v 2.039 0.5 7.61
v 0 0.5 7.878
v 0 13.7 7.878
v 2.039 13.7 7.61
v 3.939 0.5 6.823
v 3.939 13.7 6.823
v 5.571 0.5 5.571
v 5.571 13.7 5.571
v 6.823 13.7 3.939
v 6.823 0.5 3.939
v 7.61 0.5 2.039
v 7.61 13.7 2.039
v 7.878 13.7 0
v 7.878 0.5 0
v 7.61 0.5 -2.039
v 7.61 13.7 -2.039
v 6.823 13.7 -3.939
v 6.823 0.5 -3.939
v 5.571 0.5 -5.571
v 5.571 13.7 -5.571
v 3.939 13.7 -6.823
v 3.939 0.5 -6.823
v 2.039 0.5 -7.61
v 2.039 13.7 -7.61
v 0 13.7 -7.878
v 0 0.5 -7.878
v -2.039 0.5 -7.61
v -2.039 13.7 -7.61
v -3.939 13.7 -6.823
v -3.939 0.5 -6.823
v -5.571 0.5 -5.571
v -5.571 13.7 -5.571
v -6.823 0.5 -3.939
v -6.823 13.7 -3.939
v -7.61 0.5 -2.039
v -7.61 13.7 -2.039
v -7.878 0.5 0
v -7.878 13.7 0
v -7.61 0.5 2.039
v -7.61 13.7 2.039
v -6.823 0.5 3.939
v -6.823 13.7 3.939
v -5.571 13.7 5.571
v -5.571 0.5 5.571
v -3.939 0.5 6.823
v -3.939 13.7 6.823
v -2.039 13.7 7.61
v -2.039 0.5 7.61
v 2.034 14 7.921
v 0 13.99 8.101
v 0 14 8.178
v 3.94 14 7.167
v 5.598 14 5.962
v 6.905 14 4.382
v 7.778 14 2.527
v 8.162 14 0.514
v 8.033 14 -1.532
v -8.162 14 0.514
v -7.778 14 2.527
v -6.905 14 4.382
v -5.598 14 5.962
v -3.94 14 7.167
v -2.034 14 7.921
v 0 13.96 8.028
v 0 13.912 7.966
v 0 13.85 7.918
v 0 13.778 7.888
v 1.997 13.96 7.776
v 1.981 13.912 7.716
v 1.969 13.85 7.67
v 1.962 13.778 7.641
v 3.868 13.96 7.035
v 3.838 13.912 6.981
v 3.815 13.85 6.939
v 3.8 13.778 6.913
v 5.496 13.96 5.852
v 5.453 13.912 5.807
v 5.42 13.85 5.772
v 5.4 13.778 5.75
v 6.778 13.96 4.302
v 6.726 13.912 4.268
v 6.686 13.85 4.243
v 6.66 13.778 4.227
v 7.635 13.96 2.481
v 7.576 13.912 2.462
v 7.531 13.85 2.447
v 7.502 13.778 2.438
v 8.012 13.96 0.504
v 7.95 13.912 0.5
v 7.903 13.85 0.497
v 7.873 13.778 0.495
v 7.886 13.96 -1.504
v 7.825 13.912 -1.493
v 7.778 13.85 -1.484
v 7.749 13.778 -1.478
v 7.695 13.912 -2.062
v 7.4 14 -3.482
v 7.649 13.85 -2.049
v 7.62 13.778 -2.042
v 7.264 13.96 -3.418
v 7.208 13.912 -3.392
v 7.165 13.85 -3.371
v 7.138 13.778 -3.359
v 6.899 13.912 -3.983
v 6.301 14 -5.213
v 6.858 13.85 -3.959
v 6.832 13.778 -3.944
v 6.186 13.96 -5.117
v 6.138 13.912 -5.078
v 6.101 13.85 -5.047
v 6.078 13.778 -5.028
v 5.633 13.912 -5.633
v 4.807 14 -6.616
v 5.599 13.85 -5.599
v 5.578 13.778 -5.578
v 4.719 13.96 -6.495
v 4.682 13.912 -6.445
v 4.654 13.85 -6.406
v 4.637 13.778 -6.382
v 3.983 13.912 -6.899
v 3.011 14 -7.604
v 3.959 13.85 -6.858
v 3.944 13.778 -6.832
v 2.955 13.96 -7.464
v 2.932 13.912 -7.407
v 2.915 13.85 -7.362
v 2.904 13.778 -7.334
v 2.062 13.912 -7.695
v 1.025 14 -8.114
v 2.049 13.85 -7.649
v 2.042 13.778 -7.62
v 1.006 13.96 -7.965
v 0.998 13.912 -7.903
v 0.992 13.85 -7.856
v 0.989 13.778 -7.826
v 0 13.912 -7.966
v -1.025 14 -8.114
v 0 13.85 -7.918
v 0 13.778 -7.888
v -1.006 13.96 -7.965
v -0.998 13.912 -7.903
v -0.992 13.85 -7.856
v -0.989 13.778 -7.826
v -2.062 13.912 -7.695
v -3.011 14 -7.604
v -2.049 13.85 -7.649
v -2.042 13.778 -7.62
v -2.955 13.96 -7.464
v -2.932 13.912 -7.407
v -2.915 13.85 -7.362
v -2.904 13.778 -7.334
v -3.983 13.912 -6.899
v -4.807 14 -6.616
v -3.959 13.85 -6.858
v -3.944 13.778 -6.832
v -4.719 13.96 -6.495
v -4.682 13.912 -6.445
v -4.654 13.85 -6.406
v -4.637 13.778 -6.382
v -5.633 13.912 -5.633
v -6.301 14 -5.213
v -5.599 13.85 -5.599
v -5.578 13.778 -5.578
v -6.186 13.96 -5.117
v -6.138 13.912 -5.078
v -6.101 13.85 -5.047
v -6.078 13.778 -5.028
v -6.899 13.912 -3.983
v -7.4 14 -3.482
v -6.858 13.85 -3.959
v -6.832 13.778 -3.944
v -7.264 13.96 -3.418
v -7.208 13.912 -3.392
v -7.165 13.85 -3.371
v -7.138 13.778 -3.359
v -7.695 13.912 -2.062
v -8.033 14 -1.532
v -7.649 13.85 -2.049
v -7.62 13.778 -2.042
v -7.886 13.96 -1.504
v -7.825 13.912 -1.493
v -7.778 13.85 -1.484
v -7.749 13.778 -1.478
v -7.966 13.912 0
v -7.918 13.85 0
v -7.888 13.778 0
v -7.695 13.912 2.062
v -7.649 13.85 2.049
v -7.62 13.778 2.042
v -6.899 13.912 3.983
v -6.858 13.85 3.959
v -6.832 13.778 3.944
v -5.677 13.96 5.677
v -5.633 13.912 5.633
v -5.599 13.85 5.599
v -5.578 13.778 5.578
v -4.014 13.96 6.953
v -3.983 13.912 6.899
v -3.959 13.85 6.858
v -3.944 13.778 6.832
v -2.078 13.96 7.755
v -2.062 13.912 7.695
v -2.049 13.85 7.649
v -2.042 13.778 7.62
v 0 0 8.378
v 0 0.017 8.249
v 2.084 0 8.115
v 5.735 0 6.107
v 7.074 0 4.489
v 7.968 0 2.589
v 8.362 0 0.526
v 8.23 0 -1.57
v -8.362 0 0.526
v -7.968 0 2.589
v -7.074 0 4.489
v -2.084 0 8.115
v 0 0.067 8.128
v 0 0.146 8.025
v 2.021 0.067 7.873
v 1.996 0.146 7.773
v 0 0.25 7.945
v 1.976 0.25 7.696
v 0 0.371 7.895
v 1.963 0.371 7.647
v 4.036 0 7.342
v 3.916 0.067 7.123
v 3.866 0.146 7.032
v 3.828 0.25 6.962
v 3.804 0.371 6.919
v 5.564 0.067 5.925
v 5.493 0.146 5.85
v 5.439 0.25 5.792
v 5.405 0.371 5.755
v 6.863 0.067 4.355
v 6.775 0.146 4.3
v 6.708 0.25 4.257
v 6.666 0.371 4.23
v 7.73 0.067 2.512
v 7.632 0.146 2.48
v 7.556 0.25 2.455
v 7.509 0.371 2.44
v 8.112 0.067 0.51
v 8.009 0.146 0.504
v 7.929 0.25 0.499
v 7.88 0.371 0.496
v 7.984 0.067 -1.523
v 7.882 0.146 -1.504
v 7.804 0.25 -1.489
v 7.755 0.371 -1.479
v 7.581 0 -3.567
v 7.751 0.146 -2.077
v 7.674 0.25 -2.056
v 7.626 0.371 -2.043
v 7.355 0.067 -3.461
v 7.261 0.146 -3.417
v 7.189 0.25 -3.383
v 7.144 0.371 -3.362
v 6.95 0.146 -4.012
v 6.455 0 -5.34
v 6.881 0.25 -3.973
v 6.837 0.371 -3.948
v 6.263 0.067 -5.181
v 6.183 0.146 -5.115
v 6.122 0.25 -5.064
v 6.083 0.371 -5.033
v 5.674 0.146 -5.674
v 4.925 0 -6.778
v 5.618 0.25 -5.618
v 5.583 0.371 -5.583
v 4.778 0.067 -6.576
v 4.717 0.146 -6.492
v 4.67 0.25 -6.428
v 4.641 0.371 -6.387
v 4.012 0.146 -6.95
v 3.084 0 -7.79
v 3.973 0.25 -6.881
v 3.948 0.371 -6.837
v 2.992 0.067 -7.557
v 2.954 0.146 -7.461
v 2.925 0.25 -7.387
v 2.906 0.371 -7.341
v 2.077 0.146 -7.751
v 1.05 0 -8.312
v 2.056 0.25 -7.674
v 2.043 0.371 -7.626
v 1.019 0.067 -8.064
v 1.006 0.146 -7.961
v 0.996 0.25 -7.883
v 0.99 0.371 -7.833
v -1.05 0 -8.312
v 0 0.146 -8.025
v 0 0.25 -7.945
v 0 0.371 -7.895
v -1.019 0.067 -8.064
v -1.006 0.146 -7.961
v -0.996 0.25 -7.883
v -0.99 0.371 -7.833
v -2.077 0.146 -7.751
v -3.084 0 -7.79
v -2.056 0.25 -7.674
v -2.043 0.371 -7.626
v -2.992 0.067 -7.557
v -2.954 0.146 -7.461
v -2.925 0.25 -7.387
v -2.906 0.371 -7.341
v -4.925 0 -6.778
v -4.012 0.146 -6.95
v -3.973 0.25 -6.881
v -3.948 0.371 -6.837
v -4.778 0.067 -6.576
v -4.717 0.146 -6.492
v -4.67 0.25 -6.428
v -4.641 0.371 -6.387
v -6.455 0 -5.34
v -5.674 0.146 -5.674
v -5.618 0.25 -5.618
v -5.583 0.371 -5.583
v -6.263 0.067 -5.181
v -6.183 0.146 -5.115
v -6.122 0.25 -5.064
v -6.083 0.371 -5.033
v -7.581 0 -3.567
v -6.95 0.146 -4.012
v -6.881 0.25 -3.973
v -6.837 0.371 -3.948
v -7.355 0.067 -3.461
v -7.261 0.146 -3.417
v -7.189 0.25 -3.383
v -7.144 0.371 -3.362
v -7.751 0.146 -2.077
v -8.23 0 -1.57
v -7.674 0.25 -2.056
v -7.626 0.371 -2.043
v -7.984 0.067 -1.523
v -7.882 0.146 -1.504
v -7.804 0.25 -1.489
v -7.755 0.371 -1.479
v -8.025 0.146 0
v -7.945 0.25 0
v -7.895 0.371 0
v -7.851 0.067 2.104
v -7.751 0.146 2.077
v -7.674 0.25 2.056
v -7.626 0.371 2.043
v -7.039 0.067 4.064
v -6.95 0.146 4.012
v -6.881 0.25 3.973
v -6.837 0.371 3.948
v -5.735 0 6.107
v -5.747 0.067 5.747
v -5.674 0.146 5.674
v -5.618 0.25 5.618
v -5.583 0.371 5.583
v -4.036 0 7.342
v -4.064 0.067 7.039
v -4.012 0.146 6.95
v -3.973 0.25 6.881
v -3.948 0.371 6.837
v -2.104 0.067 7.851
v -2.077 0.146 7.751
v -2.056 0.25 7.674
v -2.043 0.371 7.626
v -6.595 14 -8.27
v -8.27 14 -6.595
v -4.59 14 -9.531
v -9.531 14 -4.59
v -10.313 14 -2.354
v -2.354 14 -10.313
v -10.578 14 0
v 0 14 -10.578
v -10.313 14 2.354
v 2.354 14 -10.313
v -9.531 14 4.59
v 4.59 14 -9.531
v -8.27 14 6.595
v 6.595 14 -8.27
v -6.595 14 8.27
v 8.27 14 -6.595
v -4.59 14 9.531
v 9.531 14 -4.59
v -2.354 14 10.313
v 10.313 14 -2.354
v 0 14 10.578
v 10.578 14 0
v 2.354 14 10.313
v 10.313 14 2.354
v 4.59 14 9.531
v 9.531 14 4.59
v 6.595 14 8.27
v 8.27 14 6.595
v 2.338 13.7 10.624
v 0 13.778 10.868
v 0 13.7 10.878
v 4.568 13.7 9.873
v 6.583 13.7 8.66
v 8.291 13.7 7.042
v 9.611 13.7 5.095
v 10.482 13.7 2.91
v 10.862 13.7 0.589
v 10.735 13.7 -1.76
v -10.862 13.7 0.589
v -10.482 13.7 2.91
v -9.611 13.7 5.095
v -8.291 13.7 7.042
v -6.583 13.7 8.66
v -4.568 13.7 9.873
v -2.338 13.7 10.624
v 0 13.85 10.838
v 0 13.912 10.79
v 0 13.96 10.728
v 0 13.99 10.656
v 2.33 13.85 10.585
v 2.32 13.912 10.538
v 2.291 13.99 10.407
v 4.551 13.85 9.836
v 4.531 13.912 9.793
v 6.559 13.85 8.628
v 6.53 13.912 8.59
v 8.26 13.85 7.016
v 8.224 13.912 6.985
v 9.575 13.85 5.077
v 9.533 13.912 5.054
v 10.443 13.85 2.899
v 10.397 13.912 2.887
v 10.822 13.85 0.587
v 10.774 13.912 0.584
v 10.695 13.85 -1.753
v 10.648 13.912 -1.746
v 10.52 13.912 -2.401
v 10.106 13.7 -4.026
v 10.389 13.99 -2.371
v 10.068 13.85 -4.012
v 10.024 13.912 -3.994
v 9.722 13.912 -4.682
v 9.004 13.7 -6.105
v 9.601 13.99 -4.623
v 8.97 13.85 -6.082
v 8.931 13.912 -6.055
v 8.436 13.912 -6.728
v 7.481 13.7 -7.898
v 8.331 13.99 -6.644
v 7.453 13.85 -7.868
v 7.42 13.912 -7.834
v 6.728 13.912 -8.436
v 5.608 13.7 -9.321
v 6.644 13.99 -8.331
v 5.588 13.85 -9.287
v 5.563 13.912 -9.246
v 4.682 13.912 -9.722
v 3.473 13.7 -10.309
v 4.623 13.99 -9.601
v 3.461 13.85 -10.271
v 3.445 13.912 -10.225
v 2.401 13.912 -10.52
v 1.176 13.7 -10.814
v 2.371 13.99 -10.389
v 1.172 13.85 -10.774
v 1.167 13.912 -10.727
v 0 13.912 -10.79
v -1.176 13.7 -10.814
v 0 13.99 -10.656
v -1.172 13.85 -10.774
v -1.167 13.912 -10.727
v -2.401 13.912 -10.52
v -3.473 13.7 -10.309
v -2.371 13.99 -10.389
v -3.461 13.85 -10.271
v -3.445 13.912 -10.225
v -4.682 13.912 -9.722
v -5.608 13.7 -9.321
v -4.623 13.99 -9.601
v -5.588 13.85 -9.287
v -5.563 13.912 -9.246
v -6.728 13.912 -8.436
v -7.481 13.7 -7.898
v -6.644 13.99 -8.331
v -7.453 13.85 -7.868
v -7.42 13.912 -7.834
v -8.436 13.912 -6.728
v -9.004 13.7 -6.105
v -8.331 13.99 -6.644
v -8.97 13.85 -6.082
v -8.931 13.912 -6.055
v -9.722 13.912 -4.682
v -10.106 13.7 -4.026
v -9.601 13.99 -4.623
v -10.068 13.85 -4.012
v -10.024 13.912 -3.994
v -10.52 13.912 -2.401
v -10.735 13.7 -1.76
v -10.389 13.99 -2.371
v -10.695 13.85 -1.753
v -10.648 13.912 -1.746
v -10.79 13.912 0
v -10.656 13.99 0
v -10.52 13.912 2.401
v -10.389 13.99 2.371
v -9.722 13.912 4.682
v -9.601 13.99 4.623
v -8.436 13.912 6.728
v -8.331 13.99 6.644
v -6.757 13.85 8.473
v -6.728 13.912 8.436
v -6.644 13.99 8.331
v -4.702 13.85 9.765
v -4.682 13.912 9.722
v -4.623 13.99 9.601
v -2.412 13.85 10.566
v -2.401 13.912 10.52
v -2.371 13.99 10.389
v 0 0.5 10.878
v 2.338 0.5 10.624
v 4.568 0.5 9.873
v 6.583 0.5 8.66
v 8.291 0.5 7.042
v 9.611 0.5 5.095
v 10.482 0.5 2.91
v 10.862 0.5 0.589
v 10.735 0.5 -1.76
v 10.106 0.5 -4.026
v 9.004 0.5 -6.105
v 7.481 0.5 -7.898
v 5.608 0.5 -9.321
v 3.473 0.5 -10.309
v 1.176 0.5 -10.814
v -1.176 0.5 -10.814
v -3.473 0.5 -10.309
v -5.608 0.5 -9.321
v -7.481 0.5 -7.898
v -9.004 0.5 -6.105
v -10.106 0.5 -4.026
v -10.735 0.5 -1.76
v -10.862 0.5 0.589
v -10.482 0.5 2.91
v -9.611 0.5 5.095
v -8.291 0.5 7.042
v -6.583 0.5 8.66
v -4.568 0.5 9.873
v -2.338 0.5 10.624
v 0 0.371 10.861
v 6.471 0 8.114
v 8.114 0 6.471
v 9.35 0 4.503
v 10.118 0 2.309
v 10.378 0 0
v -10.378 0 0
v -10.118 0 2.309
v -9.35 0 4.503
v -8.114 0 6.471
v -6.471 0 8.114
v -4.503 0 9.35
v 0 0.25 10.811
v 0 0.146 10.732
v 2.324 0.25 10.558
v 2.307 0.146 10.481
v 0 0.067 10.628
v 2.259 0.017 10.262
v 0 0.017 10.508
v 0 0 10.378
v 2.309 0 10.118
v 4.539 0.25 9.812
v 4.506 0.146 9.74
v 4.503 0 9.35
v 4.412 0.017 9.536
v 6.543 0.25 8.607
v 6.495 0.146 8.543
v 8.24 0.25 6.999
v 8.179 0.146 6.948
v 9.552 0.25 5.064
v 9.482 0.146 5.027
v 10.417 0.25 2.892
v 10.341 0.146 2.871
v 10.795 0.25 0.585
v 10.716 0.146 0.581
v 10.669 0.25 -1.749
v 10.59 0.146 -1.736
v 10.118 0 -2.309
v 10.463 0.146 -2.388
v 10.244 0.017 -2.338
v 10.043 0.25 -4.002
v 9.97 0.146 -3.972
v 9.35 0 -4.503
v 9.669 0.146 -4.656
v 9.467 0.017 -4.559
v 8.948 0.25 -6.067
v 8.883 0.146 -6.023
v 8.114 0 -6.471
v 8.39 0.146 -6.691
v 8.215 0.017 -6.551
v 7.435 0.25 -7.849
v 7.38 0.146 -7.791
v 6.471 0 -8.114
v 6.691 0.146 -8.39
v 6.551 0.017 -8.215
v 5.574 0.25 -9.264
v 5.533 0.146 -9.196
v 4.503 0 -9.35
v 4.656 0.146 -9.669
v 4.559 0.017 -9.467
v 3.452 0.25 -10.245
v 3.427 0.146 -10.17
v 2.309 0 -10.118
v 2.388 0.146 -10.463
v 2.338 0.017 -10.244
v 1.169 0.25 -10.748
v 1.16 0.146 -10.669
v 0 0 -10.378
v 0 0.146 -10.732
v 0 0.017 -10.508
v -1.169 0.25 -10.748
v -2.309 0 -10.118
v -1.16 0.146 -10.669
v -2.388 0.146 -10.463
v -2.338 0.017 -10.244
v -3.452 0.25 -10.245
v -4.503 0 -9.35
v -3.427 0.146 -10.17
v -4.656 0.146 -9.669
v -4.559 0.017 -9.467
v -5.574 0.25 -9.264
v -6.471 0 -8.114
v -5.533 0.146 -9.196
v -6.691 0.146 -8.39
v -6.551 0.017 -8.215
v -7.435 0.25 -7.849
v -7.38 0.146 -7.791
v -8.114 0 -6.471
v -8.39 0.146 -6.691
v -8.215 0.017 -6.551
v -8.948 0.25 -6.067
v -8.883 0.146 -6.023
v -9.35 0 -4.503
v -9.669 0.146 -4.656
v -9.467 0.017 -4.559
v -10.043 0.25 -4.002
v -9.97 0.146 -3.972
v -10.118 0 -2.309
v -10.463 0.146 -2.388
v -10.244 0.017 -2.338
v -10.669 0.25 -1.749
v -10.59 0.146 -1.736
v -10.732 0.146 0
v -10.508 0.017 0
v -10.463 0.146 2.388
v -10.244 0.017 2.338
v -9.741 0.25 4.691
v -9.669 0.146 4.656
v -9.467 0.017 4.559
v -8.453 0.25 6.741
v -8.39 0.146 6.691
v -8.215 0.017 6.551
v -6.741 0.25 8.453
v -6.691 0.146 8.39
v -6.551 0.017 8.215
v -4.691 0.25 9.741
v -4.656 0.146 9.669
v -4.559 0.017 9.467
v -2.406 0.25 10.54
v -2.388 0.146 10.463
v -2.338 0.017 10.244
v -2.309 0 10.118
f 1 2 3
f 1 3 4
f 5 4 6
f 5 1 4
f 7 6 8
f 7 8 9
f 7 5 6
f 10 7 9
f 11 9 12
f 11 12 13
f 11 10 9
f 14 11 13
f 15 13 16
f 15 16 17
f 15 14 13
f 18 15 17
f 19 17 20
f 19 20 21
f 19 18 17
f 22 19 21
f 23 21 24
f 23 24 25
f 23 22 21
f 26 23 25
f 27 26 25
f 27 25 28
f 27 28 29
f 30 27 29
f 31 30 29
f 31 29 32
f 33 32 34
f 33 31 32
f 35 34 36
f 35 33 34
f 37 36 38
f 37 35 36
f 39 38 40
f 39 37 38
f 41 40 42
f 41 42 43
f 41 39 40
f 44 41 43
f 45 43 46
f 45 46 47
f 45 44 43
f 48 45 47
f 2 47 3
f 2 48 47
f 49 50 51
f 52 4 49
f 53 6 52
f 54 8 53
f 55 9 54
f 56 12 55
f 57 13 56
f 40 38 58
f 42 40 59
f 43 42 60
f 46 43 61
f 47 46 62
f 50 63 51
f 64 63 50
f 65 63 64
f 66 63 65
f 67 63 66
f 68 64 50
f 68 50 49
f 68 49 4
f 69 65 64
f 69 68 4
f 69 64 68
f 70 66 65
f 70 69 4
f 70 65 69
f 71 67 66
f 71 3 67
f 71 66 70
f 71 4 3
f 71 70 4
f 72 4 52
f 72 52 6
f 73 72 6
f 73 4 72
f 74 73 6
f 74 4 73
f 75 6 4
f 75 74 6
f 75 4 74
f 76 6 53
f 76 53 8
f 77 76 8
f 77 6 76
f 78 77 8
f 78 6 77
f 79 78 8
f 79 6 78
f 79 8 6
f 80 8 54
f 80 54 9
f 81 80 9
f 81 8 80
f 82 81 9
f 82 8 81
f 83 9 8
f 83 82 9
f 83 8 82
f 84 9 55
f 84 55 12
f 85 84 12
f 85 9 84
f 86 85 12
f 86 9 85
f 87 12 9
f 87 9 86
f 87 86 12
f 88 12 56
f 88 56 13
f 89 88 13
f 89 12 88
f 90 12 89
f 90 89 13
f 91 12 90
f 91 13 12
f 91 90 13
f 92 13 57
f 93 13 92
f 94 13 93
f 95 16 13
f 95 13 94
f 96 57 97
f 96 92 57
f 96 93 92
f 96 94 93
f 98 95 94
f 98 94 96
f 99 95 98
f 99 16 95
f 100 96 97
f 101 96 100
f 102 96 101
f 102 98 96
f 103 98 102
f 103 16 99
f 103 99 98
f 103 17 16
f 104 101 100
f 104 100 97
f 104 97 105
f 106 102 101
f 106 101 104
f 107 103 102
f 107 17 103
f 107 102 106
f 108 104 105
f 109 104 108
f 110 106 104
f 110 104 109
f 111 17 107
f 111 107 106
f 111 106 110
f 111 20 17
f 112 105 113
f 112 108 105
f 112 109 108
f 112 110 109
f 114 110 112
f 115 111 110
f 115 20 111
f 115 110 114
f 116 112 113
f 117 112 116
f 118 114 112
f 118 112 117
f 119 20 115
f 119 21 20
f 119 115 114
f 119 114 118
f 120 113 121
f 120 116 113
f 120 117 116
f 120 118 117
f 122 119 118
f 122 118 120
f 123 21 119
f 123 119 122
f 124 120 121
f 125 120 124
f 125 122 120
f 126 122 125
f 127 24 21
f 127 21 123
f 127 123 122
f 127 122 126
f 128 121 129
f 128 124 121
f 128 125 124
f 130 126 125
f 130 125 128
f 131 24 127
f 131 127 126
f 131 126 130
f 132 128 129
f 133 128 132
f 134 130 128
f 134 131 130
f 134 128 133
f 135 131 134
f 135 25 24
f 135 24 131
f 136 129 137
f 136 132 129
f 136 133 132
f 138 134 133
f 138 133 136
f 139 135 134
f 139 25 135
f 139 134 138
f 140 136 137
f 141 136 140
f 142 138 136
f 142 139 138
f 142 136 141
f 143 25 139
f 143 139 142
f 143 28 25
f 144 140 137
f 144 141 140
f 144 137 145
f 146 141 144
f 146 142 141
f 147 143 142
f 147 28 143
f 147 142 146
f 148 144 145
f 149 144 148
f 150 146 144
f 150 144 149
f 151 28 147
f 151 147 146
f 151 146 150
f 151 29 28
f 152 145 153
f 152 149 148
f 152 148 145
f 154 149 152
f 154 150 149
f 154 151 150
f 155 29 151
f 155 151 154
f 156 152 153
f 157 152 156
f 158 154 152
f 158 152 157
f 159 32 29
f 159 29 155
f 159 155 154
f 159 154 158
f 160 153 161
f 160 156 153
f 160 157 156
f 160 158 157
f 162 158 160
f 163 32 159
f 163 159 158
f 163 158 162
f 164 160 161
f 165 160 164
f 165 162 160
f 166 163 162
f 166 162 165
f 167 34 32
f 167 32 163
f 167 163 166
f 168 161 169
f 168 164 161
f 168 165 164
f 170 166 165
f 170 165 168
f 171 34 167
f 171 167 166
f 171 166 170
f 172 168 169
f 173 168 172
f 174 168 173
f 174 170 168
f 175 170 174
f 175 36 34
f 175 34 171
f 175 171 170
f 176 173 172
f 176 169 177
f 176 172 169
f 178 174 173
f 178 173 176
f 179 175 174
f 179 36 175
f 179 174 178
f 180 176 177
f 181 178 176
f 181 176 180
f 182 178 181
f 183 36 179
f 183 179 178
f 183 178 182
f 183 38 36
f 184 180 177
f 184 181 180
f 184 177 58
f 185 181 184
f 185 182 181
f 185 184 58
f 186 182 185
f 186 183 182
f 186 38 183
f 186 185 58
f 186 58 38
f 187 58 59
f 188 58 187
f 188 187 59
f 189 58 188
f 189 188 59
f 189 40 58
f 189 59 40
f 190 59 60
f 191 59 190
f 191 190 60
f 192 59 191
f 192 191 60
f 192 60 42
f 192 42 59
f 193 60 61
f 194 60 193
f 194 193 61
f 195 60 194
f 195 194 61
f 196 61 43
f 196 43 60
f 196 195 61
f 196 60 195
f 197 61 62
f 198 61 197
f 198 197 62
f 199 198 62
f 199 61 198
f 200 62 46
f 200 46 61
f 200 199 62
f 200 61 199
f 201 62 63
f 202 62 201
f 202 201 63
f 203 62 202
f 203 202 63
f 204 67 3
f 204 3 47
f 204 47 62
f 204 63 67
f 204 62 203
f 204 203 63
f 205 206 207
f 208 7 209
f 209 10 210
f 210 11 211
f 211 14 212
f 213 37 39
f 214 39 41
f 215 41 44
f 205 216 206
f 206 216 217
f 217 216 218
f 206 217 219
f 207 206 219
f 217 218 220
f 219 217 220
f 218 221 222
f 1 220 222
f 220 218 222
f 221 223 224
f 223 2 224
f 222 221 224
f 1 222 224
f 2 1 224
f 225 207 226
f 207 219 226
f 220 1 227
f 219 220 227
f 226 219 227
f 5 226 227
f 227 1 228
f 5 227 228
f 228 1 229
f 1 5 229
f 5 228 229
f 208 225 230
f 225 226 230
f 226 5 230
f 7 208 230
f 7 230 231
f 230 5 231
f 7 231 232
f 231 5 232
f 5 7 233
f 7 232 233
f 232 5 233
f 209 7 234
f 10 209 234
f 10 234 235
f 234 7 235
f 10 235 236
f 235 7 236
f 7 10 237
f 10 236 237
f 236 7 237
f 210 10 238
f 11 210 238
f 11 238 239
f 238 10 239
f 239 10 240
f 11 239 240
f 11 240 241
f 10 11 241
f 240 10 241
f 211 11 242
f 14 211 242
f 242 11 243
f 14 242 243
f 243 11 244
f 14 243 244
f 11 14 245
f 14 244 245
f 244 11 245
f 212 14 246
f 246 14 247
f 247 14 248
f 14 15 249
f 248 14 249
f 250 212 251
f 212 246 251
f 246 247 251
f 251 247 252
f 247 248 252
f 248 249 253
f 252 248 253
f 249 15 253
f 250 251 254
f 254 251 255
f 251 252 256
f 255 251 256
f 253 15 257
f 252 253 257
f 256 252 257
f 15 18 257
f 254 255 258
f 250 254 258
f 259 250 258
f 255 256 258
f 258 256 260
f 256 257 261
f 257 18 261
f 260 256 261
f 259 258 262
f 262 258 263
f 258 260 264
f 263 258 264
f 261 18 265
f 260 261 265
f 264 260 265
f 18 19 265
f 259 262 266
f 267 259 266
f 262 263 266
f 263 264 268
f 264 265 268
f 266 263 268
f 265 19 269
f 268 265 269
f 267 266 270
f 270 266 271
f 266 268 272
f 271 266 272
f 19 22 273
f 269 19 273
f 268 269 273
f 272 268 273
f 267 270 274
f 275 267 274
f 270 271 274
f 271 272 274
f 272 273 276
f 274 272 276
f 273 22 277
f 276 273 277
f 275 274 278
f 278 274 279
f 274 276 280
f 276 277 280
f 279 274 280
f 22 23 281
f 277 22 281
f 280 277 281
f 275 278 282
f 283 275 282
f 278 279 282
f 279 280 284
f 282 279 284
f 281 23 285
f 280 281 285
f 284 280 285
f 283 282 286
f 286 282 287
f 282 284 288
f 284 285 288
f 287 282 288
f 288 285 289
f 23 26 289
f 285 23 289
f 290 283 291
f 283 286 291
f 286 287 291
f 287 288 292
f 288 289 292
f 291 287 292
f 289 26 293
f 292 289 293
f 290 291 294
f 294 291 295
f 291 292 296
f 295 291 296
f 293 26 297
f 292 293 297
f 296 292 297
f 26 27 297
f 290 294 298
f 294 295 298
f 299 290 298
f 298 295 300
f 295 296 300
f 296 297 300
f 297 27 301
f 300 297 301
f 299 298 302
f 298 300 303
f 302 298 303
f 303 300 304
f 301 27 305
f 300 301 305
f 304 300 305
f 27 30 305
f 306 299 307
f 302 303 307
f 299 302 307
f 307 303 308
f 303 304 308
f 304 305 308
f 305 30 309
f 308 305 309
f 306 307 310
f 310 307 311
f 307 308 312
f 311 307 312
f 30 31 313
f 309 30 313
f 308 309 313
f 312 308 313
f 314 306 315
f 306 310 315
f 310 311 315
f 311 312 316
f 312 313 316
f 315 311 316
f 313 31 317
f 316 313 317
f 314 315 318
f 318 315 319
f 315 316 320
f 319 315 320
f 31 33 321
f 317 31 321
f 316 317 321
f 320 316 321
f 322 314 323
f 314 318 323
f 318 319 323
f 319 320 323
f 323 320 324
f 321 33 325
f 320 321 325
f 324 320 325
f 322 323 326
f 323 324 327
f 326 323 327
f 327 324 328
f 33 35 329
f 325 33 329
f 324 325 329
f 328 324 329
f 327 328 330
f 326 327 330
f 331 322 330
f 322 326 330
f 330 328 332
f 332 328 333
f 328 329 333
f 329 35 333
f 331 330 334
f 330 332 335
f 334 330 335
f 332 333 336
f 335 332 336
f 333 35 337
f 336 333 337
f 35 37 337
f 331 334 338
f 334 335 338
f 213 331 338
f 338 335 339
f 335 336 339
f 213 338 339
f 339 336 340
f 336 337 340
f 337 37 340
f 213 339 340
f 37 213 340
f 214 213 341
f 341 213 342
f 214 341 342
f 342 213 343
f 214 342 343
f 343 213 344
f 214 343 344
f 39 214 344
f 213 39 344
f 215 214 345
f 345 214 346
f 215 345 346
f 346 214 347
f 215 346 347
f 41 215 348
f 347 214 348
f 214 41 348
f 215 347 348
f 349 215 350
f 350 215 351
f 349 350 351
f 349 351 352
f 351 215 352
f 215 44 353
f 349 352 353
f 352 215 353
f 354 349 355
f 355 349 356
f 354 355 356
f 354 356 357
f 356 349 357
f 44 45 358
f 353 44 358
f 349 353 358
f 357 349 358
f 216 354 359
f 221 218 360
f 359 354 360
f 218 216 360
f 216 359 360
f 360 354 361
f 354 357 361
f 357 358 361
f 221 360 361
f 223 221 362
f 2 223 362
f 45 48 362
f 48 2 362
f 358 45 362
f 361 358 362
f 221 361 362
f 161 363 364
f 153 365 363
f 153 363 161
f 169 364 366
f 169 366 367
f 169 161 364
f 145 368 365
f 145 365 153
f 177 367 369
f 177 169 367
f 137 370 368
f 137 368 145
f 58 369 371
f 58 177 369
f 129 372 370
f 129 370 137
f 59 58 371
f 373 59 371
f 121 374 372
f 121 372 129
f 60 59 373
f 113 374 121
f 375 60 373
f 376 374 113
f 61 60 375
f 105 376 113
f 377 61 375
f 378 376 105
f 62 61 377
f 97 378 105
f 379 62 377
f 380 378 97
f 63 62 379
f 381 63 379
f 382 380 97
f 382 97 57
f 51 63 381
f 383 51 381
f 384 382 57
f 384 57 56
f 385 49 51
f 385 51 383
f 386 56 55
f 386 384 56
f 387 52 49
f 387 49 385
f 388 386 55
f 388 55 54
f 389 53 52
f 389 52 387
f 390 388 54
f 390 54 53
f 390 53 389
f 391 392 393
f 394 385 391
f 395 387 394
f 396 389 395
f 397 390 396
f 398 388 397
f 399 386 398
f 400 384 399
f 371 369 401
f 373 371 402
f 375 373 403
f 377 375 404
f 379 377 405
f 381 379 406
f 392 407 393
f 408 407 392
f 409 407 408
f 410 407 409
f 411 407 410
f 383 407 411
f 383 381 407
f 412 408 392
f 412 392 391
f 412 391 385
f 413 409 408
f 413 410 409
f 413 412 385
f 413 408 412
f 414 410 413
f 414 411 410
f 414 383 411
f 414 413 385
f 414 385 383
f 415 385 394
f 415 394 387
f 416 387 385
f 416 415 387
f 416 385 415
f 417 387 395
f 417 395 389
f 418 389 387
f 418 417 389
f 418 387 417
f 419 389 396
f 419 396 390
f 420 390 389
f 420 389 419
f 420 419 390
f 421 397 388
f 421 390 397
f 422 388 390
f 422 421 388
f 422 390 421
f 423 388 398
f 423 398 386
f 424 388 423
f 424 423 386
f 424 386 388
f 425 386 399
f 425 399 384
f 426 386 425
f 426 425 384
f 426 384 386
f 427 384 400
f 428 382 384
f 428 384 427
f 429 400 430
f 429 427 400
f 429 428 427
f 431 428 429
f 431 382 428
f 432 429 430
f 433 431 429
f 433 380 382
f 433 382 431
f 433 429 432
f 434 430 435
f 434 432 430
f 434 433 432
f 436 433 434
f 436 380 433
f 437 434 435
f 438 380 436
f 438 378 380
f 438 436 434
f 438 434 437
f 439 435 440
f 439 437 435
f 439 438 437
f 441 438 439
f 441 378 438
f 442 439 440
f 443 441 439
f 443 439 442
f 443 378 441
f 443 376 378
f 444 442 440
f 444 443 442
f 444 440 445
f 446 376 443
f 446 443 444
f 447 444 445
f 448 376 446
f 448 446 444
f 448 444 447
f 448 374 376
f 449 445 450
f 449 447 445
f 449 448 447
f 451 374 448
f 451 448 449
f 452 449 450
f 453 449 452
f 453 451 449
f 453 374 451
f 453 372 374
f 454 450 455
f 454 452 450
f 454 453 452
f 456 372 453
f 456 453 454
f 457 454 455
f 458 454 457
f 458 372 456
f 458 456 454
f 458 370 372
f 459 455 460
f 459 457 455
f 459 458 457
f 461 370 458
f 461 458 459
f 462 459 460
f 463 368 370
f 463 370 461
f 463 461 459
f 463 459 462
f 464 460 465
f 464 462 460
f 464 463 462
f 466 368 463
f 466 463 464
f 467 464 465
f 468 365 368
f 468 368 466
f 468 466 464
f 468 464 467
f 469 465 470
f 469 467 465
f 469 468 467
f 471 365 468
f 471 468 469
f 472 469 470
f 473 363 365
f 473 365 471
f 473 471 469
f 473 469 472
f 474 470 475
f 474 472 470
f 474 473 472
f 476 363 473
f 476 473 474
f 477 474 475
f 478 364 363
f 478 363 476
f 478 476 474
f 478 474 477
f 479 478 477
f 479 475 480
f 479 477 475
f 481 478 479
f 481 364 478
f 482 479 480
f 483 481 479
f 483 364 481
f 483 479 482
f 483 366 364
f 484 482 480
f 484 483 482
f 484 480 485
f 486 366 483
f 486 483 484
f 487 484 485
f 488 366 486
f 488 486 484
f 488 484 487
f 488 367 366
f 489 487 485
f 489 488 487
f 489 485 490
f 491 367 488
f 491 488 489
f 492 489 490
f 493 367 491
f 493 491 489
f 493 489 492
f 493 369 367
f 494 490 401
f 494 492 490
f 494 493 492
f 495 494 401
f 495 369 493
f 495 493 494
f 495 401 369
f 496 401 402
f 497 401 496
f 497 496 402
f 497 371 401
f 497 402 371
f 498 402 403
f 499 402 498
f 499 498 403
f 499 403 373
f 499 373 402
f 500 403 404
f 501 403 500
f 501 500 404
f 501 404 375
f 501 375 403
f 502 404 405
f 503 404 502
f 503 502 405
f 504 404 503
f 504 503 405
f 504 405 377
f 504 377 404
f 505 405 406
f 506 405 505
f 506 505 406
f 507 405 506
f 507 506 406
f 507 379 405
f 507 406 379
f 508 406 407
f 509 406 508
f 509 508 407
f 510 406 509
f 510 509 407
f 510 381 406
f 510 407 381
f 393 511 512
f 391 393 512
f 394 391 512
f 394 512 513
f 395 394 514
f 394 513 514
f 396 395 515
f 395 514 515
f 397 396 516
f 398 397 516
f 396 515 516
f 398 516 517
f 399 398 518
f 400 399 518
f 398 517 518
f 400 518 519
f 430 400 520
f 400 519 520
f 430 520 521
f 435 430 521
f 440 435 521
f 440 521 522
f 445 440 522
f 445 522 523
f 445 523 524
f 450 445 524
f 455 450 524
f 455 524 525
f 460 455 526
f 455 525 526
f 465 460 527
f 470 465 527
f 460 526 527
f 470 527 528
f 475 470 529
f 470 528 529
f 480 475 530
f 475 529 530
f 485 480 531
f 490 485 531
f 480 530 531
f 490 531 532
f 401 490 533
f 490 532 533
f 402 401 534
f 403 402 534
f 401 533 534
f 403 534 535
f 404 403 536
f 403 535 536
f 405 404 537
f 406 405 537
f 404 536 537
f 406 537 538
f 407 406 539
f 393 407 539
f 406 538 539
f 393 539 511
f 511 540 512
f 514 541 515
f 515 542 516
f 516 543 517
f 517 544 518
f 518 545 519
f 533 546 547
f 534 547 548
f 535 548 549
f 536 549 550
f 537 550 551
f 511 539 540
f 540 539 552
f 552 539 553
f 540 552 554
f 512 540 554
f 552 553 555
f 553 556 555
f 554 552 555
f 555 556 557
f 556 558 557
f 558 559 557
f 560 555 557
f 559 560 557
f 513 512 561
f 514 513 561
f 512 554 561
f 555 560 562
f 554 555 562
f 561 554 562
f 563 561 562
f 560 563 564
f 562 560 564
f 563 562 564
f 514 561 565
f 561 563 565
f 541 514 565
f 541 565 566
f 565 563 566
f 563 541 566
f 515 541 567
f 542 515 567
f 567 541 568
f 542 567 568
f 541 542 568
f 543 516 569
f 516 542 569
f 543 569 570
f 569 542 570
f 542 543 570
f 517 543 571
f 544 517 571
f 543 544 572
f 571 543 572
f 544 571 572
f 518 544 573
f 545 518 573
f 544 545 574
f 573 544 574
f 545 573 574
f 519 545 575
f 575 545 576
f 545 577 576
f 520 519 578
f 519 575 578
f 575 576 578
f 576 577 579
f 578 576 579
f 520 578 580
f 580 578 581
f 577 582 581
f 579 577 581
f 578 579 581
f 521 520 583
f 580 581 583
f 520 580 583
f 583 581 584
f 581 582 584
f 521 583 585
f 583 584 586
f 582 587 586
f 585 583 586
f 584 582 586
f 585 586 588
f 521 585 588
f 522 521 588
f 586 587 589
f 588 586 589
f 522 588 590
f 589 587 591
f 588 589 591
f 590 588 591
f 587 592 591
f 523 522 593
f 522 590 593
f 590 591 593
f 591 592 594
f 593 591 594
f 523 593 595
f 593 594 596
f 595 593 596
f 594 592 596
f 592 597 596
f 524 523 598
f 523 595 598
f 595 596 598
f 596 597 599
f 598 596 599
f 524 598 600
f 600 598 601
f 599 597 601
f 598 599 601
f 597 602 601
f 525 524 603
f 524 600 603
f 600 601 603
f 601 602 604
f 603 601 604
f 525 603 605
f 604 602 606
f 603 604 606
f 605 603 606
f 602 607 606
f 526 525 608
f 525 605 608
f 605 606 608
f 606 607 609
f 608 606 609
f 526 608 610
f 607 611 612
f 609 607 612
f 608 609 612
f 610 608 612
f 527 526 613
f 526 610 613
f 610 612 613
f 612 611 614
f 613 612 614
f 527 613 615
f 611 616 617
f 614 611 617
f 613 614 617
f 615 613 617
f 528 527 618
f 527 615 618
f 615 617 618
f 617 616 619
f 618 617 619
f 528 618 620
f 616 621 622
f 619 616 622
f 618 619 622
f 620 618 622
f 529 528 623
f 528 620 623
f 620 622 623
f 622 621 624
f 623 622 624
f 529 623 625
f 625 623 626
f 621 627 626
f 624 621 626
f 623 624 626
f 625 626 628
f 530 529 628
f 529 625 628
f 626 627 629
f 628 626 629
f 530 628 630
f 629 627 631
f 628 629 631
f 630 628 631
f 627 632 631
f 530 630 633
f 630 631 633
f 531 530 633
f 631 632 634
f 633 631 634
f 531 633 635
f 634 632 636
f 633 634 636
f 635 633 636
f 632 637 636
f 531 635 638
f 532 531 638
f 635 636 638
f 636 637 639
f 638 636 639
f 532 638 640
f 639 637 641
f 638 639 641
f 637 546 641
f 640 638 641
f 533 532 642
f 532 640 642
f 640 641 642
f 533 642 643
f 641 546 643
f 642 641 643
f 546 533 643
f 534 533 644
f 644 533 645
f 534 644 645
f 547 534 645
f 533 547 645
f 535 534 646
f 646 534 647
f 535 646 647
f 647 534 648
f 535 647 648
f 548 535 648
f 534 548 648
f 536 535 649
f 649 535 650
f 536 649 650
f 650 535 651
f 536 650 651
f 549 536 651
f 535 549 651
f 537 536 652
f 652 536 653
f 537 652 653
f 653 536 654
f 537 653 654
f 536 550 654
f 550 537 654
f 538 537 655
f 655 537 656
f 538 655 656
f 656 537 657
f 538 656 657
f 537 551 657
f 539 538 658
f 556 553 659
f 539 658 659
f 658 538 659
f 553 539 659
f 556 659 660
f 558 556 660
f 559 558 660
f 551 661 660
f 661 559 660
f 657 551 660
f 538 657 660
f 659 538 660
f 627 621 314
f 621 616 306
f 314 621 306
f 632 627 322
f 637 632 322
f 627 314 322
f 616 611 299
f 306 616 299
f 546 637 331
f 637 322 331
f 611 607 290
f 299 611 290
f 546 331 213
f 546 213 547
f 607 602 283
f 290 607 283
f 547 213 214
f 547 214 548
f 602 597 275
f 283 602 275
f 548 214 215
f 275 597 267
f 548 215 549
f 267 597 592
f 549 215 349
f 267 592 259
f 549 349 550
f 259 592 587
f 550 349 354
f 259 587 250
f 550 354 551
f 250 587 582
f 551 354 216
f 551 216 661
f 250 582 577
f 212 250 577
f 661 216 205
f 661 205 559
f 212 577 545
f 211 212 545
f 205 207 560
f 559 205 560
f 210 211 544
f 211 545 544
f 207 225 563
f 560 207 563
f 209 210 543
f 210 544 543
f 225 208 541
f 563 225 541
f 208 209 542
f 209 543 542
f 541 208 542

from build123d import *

# Parameters (mm, degrees)
SKETCH1_R           = 10.87817
SKETCH1_R_2         = 7.87817
BOSS_EXTRUDE1_DEPTH = 14
FILLET1_R           = 0.3
FILLET5_R           = 0.3
FILLET6_R           = 0.5
FILLET7_R           = 0.5


with BuildPart() as part:
    # Sketch1 → Boss-Extrude1 (new body)
    with BuildSketch(Plane(origin=(0, 0, 0), x_dir=(1, 0, 0), z_dir=(0, 1, 0))):
        with Locations(Location((0, 0, 0), (0, 0, 270))):
            Circle(SKETCH1_R)
        with Locations(Location((0, 0, 0), (0, 0, 270))):
            Circle(SKETCH1_R_2, mode=Mode.SUBTRACT)
    extrude(amount=BOSS_EXTRUDE1_DEPTH)

    # Fillet1
    fillet1_edges = [part.edges().sort_by_distance(p)[0] for p in [
        (0, 14, -10.87817),
    ]]
    fillet(fillet1_edges, radius=FILLET1_R)

    # Fillet5
    fillet5_edges = [part.edges().sort_by_distance(p)[0] for p in [
        (0, 14, -7.87817),
    ]]
    fillet(fillet5_edges, radius=FILLET5_R)

    # Fillet6
    fillet6_edges = [part.edges().sort_by_distance(p)[0] for p in [
        (0, 0, -10.87817),
    ]]
    fillet(fillet6_edges, radius=FILLET6_R)

    # Fillet7
    fillet7_edges = [part.edges().sort_by_distance(p)[0] for p in [
        (0, 0, -7.87817),
    ]]
    fillet(fillet7_edges, radius=FILLET7_R)


solid = part.part
